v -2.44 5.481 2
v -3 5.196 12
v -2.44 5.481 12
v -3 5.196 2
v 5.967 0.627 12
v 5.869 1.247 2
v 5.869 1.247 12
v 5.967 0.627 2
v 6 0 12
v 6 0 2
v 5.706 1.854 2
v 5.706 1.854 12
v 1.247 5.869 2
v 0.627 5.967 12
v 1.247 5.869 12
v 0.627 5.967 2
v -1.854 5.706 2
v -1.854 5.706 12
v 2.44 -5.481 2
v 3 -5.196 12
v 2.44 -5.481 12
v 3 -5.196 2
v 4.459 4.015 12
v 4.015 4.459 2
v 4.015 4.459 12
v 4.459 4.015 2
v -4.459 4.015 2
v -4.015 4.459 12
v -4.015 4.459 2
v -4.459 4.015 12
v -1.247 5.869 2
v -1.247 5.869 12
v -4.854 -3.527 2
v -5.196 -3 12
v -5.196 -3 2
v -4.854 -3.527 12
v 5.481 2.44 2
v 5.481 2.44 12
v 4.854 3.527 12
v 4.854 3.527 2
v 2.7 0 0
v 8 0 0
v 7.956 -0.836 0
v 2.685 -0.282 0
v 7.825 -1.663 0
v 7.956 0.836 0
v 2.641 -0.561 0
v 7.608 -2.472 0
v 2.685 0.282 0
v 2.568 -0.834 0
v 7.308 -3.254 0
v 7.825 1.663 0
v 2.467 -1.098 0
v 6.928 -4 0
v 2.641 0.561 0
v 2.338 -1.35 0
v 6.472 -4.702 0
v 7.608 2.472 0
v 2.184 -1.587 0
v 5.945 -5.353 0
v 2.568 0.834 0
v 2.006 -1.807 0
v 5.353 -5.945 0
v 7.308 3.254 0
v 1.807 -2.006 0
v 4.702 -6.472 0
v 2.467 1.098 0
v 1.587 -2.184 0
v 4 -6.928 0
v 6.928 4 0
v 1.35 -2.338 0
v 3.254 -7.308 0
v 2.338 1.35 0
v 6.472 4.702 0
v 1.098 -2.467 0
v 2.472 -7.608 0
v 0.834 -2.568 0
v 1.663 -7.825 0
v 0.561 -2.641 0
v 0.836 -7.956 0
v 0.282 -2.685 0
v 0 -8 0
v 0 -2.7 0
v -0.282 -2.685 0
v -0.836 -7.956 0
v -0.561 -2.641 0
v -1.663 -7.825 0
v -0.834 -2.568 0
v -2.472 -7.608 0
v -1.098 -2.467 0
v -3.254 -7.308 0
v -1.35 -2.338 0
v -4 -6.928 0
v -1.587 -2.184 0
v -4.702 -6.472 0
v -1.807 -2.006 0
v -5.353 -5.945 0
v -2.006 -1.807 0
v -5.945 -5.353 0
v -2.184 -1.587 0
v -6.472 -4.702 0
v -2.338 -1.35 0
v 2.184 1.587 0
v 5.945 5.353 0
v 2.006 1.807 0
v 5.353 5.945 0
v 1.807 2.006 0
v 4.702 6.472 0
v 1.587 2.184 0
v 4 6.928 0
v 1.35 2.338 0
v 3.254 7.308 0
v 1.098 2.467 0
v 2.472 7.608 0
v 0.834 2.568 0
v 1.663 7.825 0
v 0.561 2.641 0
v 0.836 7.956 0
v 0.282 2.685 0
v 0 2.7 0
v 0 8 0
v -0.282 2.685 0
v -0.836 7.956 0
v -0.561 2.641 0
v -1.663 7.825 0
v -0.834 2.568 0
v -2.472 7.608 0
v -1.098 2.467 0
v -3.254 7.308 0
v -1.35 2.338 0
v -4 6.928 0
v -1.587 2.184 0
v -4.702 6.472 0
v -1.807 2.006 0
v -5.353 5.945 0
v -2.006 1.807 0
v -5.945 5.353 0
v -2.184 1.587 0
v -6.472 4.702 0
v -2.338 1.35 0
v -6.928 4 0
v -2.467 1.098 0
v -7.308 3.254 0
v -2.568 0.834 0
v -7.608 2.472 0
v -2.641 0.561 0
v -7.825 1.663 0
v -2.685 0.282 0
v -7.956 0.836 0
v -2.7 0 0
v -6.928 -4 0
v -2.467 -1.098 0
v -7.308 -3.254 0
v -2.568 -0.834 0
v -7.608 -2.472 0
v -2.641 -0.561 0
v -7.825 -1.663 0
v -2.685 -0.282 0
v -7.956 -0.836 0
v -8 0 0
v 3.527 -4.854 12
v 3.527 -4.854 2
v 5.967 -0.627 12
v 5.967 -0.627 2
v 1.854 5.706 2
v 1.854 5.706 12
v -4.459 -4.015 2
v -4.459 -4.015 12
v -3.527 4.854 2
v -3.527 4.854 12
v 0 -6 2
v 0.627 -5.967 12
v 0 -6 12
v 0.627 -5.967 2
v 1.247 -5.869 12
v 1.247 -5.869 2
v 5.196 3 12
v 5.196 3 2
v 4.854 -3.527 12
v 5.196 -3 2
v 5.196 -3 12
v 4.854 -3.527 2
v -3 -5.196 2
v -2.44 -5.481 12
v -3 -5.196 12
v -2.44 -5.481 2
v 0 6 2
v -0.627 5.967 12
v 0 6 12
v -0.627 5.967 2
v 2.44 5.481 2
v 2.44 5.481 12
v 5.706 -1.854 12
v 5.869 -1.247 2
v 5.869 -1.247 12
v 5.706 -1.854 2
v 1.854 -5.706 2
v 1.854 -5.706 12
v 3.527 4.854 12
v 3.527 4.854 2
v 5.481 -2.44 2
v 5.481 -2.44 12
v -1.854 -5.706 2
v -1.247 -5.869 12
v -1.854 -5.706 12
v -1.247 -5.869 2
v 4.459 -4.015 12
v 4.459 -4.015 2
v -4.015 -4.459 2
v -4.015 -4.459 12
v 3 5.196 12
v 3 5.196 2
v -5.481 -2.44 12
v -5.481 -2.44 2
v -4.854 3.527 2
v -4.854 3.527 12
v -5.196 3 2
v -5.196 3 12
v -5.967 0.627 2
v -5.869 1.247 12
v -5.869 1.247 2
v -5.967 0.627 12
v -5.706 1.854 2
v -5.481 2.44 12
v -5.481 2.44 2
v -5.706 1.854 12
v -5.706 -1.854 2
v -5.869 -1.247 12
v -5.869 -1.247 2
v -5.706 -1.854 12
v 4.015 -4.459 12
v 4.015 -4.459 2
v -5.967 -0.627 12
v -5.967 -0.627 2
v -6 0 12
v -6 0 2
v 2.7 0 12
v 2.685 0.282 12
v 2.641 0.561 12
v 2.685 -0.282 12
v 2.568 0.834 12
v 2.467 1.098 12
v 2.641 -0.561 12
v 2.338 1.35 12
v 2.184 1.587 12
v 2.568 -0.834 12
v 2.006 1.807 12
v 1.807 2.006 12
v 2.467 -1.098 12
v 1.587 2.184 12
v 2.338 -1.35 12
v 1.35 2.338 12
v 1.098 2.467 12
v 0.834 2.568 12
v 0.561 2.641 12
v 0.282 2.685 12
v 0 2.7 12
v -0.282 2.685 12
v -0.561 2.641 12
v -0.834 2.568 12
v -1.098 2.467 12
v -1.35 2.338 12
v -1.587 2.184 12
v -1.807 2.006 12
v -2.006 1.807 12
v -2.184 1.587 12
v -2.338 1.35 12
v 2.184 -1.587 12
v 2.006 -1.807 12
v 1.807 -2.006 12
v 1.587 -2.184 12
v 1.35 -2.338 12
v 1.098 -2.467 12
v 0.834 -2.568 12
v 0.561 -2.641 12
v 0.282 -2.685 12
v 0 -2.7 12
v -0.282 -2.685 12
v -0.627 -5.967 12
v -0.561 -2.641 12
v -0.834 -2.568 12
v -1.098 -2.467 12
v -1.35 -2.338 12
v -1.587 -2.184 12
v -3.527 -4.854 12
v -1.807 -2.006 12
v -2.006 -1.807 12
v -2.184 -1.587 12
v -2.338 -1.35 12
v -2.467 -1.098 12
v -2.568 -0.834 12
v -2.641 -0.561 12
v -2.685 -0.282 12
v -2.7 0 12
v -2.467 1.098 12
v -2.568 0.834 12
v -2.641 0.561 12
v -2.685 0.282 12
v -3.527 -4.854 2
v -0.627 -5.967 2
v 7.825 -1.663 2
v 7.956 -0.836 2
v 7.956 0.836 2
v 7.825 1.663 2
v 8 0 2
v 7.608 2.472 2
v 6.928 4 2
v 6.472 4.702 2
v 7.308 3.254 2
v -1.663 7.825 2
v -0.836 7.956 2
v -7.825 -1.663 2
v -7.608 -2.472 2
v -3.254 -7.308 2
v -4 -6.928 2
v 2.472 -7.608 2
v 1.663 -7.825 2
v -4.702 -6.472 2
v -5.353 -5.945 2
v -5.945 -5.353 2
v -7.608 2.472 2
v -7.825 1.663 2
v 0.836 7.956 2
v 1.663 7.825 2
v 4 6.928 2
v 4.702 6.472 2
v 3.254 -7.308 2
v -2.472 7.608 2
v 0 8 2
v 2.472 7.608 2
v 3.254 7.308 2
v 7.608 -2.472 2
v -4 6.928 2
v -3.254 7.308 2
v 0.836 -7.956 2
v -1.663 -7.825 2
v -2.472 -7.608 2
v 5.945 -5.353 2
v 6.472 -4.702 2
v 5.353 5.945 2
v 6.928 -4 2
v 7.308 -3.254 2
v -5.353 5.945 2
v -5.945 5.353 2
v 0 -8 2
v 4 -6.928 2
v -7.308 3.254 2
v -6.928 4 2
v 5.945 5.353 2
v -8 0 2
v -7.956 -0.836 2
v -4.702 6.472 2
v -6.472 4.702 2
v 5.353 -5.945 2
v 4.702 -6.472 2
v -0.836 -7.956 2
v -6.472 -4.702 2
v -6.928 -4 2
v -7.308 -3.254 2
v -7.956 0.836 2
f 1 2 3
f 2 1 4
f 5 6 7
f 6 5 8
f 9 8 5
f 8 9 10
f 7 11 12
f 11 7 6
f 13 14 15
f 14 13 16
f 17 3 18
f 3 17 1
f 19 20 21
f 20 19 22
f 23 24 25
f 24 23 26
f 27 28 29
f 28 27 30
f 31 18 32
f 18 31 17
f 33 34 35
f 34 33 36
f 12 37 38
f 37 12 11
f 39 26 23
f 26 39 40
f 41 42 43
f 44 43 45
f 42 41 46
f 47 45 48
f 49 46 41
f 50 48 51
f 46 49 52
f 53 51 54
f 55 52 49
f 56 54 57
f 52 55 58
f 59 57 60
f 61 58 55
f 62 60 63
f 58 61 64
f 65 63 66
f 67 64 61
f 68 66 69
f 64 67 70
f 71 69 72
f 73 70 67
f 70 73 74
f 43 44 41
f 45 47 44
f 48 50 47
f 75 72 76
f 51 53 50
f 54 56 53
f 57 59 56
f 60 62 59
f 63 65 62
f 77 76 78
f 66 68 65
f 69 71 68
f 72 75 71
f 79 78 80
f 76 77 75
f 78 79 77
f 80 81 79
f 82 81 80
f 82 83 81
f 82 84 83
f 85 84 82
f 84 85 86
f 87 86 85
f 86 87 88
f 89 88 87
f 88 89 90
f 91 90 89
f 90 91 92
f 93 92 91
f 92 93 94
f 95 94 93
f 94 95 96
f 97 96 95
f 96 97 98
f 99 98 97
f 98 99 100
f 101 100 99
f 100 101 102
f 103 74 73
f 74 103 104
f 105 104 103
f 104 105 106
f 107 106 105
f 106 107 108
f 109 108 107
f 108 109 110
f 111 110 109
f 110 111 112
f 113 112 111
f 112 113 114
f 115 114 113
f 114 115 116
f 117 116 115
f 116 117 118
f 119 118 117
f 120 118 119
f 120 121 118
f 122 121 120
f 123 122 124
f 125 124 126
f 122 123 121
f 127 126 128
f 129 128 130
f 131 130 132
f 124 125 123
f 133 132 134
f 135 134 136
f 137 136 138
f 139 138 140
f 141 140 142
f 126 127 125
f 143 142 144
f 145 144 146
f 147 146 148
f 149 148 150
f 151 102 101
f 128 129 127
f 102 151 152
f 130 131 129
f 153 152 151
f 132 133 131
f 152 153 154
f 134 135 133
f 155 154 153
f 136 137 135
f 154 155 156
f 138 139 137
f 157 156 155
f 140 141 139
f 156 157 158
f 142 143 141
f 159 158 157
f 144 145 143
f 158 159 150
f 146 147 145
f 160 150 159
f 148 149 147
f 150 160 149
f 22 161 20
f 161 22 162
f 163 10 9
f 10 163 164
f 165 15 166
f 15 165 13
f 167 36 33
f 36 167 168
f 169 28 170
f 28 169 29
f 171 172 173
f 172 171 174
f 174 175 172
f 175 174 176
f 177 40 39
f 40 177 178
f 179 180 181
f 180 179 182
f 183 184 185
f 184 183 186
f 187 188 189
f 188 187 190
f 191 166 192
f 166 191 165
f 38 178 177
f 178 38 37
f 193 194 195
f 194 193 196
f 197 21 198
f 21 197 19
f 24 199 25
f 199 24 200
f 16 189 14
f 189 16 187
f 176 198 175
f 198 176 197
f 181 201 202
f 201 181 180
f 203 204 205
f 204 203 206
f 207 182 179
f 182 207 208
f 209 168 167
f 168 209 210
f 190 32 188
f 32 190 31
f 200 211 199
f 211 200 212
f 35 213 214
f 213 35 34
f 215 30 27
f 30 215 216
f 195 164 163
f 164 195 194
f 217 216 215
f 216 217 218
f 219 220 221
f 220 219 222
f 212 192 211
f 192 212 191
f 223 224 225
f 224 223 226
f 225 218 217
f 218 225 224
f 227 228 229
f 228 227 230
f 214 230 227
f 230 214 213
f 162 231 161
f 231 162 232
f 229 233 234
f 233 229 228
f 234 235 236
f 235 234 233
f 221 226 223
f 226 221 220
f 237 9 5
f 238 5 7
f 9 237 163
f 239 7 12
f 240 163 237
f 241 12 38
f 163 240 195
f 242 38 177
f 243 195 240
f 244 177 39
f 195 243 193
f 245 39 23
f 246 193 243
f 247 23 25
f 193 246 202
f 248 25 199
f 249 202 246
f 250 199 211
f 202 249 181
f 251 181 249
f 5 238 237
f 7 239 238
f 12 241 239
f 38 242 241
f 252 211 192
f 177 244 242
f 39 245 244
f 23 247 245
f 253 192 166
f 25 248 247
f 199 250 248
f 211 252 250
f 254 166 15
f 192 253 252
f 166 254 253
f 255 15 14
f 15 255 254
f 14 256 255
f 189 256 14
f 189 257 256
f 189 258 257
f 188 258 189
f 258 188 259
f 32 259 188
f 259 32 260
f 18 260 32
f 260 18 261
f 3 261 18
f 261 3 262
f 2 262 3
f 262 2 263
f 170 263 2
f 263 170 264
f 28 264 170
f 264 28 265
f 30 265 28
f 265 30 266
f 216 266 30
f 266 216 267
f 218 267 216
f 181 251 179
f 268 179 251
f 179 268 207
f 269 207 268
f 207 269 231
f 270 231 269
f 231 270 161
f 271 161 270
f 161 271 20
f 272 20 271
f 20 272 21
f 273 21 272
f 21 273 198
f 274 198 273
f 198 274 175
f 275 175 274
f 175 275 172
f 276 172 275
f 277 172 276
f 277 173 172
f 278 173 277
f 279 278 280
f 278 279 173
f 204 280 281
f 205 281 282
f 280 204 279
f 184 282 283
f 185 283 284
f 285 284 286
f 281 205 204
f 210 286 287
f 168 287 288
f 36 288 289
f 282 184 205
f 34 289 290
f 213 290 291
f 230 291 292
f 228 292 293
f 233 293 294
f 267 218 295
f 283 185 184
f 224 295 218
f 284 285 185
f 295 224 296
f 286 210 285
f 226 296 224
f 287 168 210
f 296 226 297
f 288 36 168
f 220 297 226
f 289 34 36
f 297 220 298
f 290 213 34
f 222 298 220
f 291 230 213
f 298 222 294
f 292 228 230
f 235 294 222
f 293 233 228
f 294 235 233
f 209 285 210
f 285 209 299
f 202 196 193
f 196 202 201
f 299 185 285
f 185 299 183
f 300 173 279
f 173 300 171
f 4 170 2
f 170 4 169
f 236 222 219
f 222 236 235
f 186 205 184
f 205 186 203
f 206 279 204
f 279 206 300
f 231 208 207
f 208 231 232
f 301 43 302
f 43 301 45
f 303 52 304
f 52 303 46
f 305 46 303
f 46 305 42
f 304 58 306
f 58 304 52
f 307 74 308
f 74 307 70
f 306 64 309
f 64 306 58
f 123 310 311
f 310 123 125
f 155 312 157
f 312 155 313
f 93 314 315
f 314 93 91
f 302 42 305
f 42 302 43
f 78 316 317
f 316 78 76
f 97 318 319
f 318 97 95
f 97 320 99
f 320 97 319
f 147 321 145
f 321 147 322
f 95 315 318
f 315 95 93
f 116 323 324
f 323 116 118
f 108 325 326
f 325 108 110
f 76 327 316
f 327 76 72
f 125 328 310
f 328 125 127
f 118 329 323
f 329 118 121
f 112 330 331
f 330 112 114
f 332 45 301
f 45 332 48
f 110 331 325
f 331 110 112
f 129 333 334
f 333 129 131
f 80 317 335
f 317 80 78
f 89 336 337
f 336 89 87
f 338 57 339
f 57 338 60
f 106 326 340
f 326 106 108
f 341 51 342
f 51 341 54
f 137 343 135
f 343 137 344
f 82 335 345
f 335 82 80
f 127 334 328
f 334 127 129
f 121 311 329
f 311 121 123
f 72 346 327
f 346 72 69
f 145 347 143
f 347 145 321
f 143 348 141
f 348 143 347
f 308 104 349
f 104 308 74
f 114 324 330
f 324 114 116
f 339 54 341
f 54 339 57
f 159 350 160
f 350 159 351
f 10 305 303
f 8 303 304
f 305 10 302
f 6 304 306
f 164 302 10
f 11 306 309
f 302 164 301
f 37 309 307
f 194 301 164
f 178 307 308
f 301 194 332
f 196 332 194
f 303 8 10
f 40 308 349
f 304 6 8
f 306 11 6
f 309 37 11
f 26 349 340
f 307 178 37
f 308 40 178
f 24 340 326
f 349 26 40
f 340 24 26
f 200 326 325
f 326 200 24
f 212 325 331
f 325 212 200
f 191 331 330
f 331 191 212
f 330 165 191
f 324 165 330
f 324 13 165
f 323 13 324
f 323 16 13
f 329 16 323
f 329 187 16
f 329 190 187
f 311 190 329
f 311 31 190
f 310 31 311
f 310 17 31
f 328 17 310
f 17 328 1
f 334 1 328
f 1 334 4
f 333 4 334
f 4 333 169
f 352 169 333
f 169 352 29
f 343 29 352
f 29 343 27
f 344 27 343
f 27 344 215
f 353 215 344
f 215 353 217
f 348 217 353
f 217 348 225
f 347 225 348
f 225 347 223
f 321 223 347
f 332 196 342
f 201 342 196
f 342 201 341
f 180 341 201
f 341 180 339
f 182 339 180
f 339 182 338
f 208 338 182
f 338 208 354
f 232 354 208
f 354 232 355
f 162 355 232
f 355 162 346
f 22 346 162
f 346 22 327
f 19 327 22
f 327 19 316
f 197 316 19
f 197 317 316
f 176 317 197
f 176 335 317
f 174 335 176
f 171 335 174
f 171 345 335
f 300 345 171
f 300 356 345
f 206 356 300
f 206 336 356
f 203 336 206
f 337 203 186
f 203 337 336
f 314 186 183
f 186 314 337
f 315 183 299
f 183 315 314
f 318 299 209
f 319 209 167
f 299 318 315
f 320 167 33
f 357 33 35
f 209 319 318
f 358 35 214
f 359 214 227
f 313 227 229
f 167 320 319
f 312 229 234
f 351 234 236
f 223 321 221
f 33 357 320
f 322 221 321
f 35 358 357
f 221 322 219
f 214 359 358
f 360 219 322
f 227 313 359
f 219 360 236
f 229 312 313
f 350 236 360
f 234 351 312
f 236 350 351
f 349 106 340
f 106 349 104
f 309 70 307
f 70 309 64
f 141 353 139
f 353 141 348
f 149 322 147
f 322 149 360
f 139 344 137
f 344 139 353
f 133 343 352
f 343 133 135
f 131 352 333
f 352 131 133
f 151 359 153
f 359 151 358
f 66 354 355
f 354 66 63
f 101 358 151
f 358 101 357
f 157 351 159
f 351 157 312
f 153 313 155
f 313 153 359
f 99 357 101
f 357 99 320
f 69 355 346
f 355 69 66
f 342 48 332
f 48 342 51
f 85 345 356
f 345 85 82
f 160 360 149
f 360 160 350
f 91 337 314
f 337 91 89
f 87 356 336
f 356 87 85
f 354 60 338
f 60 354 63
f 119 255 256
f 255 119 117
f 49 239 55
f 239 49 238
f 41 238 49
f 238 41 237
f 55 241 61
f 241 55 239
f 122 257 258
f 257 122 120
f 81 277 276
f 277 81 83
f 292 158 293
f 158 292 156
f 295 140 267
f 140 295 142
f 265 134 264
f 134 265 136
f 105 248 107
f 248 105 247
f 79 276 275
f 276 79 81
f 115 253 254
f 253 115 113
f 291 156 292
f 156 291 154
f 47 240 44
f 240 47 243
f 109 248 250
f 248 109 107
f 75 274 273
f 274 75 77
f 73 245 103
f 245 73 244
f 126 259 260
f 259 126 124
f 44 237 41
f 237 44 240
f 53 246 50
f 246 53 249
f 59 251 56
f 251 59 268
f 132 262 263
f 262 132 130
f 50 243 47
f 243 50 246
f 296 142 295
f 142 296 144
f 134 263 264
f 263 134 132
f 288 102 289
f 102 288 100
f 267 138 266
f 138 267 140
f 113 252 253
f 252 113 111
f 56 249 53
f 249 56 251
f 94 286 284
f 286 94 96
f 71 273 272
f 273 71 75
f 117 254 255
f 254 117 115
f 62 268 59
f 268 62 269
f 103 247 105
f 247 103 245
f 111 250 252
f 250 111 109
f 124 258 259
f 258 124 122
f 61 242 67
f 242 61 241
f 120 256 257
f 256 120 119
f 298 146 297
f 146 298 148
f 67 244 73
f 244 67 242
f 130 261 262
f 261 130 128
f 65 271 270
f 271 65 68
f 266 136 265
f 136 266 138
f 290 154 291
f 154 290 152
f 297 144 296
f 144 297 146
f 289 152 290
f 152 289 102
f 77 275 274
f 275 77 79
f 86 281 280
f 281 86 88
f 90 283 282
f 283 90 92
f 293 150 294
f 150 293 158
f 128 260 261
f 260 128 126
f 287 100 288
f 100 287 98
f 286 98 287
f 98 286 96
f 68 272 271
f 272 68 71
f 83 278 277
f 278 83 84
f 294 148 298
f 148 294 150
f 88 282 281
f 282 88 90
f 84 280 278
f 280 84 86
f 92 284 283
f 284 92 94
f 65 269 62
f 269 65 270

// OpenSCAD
// Motor mounting standoff.
$fn = 60;
eps = 0.02;
thread_d = 5.4;
outer_d = 12;
length = 12;
difference() {
    union() { cylinder(d=outer_d,h=length); cylinder(d=outer_d+4,h=2); }
    translate([0,0,-eps]) cylinder(d=thread_d,h=length+2*eps);
}
